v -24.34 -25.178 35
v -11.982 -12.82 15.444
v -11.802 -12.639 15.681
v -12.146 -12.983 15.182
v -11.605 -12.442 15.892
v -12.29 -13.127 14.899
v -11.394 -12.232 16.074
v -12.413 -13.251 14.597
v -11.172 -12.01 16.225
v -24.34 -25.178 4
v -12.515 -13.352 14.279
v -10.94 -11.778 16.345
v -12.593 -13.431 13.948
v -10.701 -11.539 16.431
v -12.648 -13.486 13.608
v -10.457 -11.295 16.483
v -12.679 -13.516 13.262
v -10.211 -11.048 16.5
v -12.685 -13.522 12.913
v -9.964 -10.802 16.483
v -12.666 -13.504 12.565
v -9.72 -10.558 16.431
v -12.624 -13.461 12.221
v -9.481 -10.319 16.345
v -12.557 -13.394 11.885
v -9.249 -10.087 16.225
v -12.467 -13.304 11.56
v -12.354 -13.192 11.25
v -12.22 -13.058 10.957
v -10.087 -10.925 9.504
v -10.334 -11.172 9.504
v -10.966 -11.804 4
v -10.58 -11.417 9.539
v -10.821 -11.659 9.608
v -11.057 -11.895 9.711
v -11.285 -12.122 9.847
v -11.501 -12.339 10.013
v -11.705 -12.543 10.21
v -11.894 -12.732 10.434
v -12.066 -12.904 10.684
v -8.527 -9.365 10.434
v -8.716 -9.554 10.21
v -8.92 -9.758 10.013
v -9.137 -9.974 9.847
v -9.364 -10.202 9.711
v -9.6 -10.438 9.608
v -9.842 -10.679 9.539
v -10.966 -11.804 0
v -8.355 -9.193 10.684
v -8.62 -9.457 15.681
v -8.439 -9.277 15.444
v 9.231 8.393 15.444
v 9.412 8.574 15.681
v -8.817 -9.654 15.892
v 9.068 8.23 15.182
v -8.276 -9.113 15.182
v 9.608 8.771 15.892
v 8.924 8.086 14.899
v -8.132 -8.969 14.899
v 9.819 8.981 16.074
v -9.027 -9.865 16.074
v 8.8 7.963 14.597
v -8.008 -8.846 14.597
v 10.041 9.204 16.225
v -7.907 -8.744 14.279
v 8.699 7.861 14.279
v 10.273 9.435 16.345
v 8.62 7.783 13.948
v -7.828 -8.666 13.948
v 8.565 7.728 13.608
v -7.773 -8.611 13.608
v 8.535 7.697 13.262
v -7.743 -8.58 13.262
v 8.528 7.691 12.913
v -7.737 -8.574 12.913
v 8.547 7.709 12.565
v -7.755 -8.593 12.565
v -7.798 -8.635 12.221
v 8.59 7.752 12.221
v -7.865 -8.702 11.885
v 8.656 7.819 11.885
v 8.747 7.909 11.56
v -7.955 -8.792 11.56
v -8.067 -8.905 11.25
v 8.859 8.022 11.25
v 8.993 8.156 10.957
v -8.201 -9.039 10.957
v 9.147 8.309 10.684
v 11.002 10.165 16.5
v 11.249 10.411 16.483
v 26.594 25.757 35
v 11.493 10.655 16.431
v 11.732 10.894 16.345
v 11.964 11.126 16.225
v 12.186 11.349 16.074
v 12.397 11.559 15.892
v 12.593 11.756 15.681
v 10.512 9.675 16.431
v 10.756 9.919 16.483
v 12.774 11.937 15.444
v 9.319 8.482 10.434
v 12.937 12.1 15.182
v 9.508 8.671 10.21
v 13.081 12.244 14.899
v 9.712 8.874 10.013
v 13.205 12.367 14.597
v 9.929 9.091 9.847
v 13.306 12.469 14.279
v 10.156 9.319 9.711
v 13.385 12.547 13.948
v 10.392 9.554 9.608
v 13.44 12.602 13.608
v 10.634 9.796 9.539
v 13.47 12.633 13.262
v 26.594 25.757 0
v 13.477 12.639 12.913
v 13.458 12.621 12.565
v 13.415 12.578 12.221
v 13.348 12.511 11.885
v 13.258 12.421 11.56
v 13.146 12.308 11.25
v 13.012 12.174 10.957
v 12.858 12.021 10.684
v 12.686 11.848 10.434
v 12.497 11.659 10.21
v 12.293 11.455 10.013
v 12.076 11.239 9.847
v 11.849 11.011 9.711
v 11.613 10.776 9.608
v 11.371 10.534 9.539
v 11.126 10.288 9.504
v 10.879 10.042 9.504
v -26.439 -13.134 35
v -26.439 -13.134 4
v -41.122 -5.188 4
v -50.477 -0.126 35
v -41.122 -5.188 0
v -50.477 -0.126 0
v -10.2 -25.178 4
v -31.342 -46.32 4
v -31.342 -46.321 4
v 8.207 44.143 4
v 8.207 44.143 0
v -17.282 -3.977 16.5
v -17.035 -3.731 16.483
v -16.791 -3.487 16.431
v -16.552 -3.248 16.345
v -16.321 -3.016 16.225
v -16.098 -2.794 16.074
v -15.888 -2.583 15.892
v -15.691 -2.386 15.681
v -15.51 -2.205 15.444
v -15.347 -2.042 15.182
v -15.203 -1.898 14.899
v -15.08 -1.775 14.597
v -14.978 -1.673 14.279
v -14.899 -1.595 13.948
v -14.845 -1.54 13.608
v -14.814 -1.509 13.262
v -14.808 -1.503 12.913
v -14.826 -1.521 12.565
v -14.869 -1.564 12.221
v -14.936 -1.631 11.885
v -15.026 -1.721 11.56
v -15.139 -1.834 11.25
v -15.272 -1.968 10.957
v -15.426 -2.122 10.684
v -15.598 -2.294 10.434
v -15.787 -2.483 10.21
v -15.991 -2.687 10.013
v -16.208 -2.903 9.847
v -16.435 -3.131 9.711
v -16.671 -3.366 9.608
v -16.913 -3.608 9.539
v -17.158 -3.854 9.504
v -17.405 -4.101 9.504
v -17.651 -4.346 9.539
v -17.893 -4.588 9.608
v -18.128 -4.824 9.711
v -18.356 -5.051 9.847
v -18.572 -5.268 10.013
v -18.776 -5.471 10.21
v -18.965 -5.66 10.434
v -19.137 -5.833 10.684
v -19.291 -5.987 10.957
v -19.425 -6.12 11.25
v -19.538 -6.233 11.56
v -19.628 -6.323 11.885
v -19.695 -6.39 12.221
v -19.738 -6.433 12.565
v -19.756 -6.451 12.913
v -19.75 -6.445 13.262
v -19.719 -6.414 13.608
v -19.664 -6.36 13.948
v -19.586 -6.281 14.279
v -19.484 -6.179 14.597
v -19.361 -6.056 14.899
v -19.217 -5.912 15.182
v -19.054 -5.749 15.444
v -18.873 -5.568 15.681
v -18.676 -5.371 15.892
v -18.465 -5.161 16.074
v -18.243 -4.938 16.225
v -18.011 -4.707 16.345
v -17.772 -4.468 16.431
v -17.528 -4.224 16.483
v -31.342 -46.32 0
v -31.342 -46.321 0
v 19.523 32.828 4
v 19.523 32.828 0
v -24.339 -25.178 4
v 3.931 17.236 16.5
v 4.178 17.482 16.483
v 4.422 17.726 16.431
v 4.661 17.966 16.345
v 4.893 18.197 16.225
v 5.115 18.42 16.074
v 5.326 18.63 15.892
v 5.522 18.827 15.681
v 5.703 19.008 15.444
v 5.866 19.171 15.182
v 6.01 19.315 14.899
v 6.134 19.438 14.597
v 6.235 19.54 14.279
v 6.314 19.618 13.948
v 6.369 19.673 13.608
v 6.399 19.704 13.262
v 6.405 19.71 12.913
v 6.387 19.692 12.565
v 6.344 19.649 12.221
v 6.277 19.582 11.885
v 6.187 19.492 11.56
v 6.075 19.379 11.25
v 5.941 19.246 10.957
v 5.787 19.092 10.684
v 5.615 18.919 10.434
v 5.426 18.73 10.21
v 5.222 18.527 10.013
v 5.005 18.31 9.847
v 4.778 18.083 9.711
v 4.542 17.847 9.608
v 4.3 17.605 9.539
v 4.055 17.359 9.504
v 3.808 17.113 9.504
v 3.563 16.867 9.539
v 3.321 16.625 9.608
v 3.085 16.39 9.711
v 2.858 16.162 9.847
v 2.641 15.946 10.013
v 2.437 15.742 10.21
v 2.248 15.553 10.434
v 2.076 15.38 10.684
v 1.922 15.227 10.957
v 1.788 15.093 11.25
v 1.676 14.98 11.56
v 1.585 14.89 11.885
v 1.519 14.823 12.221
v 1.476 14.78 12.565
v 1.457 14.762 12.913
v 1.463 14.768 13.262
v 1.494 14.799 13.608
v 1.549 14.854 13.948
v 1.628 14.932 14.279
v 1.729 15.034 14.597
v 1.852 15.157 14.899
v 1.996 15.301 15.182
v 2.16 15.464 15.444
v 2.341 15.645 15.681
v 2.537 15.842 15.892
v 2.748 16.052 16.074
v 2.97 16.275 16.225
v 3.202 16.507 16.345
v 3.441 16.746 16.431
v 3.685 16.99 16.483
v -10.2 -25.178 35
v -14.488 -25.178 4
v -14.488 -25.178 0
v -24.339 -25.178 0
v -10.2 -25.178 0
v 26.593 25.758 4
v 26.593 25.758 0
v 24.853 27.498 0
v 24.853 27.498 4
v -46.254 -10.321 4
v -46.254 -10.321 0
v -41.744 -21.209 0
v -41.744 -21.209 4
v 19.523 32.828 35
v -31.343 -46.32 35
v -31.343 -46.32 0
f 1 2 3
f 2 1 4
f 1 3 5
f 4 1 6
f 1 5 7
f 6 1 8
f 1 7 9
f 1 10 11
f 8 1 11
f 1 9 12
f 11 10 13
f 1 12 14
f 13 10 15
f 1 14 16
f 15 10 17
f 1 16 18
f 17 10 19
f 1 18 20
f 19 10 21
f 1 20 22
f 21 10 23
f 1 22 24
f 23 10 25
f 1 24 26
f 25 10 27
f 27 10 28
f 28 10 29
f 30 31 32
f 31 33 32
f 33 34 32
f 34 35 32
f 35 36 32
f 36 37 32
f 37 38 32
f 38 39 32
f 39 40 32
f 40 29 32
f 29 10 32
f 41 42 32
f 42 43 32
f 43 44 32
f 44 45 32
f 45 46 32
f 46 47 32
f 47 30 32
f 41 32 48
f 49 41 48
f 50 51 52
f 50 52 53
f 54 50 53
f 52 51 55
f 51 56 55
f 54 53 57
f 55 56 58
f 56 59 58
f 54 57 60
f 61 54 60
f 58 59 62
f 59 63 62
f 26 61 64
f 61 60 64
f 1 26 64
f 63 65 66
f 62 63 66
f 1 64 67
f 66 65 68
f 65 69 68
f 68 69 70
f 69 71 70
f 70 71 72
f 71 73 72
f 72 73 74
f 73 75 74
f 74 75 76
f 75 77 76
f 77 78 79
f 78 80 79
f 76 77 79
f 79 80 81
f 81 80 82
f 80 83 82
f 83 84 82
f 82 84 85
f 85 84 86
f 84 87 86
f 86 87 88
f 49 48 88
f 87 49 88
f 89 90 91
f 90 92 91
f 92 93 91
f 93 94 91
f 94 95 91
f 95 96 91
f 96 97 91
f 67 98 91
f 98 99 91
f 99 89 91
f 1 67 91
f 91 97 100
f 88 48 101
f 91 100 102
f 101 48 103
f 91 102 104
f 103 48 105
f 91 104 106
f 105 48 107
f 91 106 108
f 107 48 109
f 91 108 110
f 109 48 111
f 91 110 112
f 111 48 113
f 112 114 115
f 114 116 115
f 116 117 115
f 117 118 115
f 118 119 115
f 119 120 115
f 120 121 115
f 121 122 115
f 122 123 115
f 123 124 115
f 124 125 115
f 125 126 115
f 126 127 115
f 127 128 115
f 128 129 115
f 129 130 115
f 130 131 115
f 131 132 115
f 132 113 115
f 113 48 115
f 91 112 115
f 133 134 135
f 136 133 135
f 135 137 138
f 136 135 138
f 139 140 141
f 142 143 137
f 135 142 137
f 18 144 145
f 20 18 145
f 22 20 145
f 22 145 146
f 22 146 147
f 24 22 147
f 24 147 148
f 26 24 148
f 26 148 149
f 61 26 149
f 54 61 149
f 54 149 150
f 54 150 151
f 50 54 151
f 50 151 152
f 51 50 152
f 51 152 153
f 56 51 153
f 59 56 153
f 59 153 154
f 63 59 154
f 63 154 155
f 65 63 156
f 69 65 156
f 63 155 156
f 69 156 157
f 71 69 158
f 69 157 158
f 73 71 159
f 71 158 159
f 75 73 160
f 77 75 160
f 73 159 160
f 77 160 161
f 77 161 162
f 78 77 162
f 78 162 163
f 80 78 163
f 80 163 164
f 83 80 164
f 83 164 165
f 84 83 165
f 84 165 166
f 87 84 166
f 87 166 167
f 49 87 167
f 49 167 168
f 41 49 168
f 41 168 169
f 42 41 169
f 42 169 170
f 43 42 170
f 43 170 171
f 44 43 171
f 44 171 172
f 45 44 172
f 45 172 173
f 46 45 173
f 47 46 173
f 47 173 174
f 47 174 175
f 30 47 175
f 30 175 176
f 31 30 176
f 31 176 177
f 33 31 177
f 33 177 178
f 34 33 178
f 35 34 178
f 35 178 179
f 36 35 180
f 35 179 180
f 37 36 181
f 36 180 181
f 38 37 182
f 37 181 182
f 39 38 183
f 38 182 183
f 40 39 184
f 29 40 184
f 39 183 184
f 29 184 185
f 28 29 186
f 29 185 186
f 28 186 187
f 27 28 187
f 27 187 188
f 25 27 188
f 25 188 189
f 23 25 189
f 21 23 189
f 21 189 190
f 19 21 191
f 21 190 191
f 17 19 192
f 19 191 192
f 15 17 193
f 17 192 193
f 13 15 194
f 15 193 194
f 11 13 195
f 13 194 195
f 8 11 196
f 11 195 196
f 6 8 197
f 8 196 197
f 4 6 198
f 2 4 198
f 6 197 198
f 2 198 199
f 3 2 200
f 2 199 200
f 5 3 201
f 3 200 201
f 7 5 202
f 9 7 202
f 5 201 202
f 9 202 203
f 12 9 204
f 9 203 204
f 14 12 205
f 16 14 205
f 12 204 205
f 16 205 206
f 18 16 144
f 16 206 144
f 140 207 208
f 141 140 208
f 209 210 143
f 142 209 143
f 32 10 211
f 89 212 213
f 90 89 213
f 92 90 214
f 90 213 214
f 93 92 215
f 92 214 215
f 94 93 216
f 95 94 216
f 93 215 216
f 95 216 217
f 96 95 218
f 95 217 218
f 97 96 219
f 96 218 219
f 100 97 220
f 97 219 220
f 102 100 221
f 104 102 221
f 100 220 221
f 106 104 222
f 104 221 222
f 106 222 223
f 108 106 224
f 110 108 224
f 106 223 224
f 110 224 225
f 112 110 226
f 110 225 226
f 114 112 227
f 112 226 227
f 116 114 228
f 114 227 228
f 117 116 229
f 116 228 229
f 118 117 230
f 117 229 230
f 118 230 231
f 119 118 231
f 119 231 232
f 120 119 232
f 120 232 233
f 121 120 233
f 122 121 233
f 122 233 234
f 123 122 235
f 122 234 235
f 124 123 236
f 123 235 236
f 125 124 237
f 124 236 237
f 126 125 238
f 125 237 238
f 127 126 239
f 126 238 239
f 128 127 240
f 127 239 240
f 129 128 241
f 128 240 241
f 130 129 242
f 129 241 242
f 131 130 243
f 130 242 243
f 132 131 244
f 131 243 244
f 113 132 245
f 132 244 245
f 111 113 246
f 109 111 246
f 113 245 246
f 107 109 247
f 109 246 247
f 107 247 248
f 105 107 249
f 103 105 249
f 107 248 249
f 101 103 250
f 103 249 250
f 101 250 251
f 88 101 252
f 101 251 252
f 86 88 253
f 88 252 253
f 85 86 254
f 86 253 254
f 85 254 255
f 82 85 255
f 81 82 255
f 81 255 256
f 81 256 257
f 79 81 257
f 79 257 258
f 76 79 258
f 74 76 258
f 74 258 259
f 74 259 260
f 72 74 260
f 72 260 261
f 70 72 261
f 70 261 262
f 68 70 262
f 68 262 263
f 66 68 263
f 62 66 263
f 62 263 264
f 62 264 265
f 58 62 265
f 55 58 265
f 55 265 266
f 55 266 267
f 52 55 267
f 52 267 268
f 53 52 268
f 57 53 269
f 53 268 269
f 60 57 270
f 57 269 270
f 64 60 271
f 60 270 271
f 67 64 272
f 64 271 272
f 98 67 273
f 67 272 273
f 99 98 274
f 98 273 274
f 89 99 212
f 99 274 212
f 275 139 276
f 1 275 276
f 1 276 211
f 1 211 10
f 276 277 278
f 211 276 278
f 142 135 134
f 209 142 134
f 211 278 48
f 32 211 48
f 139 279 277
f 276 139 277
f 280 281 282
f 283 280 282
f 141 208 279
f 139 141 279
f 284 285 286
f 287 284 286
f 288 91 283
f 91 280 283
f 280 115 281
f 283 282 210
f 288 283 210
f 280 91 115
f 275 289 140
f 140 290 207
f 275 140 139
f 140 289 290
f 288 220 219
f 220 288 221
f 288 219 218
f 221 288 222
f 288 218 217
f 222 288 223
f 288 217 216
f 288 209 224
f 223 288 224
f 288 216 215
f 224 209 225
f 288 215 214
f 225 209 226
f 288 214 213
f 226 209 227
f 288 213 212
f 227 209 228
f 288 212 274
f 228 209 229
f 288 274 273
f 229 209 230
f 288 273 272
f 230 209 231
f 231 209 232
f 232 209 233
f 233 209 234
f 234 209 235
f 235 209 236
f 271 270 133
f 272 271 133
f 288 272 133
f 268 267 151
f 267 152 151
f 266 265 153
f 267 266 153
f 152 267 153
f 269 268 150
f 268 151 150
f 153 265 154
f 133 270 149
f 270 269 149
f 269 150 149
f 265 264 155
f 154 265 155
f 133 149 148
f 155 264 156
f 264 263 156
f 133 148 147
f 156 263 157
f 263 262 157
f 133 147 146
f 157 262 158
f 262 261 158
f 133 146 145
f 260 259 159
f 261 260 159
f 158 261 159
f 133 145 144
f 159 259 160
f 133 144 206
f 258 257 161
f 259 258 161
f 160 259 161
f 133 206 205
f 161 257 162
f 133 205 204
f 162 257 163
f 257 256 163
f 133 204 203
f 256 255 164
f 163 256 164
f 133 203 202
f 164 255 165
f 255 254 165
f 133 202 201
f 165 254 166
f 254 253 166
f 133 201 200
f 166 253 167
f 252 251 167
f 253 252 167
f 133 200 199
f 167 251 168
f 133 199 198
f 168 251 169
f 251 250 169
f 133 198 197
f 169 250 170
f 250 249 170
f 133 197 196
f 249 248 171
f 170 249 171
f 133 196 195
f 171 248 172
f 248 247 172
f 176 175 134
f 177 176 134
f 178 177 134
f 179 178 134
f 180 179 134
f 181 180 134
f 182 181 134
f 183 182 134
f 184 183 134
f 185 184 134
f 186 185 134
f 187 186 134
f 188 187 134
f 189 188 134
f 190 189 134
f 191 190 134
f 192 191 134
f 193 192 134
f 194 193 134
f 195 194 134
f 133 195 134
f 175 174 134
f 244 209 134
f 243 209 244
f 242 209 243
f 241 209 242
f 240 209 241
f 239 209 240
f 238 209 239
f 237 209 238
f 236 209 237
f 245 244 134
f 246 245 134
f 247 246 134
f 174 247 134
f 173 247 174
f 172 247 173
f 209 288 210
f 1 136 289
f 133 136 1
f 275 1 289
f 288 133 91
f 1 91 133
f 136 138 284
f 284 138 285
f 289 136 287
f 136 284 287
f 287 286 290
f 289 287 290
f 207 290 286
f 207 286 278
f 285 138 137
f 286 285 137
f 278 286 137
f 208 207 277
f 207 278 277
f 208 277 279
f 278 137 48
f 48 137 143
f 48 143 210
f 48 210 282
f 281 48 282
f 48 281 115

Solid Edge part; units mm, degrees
sketch "Sketch1" plane through (0, 0, 0) normal (0, 0, 1) x (1, 0, 0)
  line L0 (-50.4769, -0.1262) -> (-31.3427, -46.3202)
  line L1 (-31.3427, -46.3202) -> (-10.2002, -25.1777)
  line L2 (-10.2002, -25.1777) -> (-24.3402, -25.1777)
  line L3 (-24.3402, -25.1777) -> (26.5942, 25.7567)
  line L4 (26.5942, 25.7567) -> (19.5231, 32.8278)
  line L5 (19.5231, 32.8278) -> (-26.4388, -13.1341)
  line L6 (-26.4388, -13.1341) -> (-50.4769, -0.1262)
  dimension "D1" = 50
  dimension "D2" = 29.9
  dimension "D3" = 10
  dimension "D4" = 65
  dimension "D5" = 14.14
  dimension "D6" = 70
extrude "Protrusion1" add sketch "Sketch1" along normal blind 35
sketch "Sketch2" plane through (-12.0121, -6.8169, 0) normal (0, 0, -1) x (-0.8795, 0.4759, 0)
  line L0 (-1.7996, -43.9425) -> (-10.3318, -15.2857)
  line L1 (-10.3318, -15.2857) -> (2.1041, -22.0153)
  line L2 (2.1041, -22.0153) -> (-18.451, 47.0217)
  line L3 (-18.451, 47.0217) -> (6.4693, 54.4415)
  line L4 (6.4693, 54.4415) -> (28.4484, -19.3779)
  line L5 (28.4484, -19.3779) -> (-1.7996, -43.9425)
  dimension "D1" = 36
extrude "Extrusionsausprägung_6" add sketch "Sketch2" against normal blind 4
sketch "Sketch3" plane through (-3.4579, 9.8468, 19.5) normal (-0.7071, 0.7071, 0) x (0, 0, 1)
  circle A0 centre (-6.5, 10.45) radius 3.5
  circle A1 centre (-6.5, -19.55) radius 3.5
  dimension "D1" = 7
  dimension "D2" = 22.05
  dimension "D3" = 13
  dimension "D4" = 30
extrude "Cutout1" cut sketch "Sketch3" against normal through all
properties material "Nylon, allgemein"
